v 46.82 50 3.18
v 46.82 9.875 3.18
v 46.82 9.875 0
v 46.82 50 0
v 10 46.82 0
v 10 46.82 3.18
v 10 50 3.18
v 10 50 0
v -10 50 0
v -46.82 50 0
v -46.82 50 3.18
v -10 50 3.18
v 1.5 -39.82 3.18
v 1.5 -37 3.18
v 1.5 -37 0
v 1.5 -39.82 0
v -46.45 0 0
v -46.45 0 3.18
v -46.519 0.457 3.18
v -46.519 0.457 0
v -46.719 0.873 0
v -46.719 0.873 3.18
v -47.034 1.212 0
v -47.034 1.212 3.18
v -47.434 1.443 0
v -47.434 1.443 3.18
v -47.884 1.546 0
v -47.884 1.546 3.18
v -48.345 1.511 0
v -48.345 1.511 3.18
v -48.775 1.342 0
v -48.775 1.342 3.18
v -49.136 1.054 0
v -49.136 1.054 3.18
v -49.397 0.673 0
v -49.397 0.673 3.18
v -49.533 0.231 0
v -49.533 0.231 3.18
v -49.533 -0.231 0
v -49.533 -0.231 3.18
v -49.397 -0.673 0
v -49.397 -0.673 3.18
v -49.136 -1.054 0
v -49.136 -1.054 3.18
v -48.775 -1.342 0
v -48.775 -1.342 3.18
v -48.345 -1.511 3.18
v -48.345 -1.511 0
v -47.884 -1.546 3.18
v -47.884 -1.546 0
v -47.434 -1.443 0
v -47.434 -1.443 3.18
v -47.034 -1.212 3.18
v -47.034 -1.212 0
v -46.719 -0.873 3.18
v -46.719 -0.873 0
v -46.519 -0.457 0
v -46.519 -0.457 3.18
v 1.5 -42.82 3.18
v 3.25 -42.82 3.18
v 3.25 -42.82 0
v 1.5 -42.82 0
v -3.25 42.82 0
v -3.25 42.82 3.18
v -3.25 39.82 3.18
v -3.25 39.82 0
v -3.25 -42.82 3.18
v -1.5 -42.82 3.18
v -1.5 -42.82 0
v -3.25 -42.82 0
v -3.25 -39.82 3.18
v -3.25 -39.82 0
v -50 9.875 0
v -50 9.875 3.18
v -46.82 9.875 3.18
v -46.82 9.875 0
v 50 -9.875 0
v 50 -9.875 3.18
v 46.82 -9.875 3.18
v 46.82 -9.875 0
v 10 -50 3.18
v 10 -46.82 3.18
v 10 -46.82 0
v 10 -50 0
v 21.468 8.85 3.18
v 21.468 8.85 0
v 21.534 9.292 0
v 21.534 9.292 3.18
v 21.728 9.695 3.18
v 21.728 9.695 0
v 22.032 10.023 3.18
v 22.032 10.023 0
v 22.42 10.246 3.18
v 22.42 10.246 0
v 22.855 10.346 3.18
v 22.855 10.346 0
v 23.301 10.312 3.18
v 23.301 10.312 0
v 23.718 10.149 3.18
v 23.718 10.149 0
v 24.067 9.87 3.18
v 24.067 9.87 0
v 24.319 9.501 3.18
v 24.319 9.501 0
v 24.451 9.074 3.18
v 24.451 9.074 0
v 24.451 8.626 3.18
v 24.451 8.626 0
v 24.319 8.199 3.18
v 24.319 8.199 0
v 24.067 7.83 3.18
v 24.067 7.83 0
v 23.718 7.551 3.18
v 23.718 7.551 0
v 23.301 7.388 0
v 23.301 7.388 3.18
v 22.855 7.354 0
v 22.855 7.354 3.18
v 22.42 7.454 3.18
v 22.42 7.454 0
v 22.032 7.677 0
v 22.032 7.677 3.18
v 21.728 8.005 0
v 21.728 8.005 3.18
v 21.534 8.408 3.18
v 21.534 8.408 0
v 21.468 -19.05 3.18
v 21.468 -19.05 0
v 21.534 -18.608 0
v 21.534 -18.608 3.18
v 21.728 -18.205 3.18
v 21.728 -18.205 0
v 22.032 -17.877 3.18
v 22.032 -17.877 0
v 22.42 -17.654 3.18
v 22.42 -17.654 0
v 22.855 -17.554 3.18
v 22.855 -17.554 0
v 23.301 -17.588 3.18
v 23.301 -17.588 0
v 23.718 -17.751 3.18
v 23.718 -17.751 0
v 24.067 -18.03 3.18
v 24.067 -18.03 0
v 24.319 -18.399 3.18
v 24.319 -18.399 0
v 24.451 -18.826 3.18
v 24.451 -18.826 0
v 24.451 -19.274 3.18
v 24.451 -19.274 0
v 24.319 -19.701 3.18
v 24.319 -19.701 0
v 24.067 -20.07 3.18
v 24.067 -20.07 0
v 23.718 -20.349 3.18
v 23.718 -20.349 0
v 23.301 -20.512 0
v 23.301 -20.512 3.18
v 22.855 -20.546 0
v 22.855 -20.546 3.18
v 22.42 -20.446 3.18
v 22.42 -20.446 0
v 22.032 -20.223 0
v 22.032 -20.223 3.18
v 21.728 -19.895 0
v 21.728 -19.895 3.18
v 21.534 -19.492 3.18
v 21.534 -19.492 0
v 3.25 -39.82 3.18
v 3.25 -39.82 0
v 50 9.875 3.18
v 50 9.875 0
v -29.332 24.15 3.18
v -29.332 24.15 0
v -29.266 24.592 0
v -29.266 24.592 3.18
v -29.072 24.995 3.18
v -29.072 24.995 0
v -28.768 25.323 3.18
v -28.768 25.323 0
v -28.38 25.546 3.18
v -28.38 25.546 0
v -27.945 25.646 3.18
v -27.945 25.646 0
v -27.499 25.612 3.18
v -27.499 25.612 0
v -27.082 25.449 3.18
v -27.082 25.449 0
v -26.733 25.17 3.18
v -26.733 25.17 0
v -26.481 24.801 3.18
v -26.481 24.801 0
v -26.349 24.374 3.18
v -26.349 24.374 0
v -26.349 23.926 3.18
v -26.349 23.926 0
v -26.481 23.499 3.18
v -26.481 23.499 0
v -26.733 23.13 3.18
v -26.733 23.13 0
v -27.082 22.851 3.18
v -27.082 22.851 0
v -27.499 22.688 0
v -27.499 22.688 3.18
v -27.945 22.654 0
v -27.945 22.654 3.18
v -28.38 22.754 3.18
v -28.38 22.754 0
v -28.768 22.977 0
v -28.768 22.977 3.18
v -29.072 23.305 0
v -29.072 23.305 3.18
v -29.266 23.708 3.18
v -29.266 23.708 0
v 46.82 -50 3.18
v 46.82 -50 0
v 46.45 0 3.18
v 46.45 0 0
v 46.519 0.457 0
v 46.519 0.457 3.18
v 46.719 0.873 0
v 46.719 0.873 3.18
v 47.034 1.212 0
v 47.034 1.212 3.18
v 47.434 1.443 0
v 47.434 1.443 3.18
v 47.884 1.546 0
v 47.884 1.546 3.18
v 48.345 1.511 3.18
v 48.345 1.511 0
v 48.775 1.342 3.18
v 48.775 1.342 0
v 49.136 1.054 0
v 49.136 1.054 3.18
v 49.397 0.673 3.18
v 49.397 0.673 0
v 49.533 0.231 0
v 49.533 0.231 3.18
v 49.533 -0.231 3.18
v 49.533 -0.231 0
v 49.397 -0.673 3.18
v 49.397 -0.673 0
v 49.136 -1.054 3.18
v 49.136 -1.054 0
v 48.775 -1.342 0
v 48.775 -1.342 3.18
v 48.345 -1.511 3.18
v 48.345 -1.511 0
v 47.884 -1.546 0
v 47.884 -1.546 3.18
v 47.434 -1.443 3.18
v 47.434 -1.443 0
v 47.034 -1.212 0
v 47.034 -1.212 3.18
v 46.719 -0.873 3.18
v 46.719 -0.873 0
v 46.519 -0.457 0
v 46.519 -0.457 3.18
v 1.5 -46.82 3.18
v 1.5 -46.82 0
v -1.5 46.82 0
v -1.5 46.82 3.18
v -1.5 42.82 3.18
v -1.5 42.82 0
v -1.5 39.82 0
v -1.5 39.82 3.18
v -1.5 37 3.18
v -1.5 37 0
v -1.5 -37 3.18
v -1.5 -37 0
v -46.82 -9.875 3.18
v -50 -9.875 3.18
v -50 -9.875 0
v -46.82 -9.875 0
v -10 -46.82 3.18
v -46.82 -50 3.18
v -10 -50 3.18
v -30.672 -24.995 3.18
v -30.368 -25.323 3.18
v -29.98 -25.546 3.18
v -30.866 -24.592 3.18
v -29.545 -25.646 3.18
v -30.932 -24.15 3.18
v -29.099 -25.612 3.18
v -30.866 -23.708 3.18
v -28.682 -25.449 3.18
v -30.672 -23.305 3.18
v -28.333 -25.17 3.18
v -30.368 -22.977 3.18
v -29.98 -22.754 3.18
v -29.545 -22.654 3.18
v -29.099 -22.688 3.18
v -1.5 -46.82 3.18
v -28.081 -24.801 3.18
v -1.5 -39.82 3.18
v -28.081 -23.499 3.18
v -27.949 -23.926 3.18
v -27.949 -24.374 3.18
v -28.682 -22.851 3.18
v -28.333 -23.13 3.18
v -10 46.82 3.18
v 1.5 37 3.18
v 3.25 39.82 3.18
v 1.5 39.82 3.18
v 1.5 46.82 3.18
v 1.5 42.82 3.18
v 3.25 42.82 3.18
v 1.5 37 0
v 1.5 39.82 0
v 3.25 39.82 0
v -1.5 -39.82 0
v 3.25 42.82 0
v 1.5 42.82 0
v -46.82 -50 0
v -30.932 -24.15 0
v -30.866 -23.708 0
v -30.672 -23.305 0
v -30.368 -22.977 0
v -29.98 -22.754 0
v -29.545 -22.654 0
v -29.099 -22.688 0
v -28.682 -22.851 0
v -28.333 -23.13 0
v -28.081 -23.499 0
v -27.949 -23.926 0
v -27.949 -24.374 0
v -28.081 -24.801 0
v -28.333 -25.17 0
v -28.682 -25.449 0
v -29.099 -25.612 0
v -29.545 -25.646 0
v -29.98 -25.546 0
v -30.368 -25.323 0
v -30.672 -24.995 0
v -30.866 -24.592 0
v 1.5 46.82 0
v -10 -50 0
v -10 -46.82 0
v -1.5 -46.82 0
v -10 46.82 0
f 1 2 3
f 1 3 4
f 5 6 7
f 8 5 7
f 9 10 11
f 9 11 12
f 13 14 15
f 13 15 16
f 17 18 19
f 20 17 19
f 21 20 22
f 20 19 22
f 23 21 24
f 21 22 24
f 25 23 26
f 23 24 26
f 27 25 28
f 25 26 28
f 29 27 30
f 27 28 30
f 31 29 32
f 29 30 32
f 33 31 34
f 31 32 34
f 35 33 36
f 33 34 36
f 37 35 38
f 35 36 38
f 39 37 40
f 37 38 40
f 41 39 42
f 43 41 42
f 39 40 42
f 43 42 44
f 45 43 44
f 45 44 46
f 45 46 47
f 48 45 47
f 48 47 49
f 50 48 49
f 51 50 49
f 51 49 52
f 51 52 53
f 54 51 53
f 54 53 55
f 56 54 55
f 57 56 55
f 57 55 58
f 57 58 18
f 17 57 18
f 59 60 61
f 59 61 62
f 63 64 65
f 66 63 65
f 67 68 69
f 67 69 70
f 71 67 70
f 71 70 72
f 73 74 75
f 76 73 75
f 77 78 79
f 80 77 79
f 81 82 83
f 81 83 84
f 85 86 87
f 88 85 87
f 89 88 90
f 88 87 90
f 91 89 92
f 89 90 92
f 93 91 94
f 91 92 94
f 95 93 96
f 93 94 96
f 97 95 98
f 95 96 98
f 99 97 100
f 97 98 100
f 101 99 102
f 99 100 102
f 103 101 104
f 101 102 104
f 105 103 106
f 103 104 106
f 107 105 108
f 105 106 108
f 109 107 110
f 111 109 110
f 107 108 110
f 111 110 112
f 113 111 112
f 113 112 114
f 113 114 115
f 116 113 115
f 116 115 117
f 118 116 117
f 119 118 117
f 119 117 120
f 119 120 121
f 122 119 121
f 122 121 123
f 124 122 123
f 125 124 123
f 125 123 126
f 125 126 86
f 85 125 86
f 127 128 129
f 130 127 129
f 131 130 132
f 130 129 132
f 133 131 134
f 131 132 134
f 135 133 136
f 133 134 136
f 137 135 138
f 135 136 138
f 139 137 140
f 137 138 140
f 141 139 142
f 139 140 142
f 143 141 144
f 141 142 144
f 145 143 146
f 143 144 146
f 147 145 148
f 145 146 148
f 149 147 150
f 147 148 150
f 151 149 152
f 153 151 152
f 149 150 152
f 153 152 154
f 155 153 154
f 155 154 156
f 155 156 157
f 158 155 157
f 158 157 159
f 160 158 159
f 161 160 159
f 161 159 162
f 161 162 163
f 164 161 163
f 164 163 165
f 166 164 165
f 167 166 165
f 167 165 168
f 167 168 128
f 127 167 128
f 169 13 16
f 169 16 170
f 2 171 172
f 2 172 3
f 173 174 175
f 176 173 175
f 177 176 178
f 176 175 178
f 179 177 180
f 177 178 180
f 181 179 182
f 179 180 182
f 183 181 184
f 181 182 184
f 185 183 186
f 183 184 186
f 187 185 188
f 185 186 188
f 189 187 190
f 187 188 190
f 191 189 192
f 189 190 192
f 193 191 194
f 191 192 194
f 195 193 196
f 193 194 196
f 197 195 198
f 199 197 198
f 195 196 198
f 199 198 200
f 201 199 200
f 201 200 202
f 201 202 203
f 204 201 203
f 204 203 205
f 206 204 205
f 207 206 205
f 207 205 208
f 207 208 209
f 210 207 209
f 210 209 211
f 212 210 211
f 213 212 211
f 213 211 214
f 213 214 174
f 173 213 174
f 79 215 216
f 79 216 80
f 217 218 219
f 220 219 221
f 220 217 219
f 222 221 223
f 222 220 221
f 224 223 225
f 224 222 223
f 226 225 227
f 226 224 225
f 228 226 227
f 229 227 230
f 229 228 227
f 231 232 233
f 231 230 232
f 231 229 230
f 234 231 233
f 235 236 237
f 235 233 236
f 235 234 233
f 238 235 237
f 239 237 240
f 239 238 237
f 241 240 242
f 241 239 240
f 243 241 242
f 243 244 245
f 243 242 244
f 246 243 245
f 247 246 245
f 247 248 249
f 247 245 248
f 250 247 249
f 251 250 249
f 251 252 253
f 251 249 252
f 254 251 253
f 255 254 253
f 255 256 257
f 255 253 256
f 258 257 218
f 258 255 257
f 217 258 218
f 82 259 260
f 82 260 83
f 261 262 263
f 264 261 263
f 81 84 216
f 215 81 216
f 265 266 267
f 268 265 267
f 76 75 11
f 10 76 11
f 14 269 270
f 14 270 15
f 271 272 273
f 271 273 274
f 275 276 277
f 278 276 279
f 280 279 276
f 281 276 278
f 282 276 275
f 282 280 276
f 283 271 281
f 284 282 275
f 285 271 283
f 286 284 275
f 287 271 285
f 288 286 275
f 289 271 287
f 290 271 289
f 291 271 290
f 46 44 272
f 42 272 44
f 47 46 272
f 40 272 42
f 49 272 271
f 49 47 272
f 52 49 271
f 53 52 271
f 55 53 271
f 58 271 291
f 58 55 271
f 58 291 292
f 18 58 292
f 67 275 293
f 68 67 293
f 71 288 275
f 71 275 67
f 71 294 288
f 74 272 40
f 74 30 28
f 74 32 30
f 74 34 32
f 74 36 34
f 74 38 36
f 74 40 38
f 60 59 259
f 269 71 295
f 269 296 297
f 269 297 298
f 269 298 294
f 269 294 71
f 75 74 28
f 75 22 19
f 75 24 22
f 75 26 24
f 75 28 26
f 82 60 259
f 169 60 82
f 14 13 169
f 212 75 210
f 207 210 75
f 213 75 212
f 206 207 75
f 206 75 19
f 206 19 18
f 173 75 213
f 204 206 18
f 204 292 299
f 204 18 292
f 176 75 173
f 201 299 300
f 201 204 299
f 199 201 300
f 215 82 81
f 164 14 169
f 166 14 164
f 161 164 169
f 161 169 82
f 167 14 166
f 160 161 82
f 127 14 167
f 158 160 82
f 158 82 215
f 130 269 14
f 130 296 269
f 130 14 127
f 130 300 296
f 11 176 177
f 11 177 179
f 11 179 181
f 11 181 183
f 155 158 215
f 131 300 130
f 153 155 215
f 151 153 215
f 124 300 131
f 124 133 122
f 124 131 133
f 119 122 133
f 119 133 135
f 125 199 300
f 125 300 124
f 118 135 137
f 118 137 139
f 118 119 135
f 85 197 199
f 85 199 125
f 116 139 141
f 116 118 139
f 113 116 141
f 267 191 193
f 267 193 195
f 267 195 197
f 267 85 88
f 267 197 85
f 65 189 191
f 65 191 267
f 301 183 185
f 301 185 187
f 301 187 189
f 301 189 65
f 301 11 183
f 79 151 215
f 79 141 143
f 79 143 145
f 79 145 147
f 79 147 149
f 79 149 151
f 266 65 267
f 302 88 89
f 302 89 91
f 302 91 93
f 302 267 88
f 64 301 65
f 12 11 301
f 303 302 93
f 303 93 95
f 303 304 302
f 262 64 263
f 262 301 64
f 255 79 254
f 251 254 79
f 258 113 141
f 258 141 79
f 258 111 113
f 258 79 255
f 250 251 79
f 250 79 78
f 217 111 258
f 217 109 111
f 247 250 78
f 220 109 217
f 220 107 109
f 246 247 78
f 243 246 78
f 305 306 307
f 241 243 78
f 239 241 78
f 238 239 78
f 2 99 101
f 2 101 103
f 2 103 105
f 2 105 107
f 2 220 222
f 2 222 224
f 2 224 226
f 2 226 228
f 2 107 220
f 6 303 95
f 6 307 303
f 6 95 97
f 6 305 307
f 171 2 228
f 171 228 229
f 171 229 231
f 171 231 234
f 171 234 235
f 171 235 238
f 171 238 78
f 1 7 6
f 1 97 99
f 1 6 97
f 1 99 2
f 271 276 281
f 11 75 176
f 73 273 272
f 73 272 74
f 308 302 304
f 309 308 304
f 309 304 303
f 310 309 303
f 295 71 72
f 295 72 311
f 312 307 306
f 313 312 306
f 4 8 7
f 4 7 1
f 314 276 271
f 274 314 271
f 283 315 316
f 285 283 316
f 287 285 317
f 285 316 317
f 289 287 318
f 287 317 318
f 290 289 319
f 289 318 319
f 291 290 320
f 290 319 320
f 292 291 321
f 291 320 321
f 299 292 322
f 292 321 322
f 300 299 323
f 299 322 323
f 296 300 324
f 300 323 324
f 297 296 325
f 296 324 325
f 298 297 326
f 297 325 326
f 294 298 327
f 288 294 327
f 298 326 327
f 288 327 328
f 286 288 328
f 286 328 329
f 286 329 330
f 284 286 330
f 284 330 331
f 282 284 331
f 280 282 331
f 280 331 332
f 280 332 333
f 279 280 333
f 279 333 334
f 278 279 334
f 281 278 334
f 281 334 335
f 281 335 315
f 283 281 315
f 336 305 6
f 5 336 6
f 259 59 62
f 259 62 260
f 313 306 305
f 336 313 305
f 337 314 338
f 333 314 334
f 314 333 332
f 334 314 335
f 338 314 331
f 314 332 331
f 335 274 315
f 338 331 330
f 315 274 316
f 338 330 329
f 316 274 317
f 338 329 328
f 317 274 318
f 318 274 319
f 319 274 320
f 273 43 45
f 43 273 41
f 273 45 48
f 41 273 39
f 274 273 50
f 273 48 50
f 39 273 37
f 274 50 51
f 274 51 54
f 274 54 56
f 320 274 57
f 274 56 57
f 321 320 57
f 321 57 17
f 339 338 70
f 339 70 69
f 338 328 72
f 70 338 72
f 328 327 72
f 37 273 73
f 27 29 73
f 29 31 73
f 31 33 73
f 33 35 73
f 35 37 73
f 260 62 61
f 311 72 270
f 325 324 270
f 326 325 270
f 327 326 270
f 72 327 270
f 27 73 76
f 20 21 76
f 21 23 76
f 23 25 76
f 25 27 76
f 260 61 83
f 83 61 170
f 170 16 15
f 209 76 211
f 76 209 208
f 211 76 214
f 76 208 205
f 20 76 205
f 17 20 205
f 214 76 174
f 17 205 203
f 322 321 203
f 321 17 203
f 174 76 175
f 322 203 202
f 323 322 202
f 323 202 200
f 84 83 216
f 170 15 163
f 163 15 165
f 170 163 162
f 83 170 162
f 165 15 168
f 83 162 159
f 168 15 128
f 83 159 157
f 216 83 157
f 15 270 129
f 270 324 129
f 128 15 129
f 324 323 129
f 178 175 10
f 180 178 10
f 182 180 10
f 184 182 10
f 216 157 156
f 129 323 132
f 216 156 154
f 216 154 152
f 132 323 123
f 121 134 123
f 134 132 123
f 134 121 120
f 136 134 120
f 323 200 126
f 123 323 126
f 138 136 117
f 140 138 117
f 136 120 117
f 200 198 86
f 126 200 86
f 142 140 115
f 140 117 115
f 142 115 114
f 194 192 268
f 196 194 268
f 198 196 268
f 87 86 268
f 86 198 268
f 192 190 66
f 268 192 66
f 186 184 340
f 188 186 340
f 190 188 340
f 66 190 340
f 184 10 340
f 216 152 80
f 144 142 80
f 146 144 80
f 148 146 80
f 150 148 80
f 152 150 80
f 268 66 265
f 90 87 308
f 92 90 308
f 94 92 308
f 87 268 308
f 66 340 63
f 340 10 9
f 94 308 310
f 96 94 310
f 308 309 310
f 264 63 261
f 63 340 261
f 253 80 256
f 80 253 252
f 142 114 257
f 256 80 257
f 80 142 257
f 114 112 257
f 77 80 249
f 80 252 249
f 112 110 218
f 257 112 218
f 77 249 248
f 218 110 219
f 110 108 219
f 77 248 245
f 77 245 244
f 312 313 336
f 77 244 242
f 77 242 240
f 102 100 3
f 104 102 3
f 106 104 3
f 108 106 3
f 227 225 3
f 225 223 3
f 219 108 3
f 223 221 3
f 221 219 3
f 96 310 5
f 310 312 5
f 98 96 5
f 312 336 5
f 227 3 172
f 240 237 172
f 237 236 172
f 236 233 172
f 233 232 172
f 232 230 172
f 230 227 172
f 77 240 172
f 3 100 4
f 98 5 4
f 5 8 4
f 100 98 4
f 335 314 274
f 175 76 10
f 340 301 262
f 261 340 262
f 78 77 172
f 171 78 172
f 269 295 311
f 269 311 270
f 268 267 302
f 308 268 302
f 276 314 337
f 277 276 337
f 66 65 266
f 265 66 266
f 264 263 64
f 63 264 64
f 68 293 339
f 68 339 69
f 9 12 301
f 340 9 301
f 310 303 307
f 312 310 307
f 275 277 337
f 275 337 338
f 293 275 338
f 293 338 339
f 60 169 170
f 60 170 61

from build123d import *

# Parameters (mm, degrees)
SKETCH1_W           = 100
SKETCH1_H           = 100
BOSS_EXTRUDE2_DEPTH = 3.18
SKETCH2_R           = 1.55
SKETCH2_W           = 3.18
SKETCH2_H           = 40.125
CUT_EXTRUDE1_DEPTH  = 4.18
SKETCH3_R           = 1.5
CUT_EXTRUDE2_DEPTH  = 4.18


with BuildPart() as part:
    # Sketch1 → Boss-Extrude2 (new body)
    with BuildSketch(Plane.XY):
        Rectangle(SKETCH1_W, SKETCH1_H)
    extrude(amount=BOSS_EXTRUDE2_DEPTH)

    # Sketch2 → Cut-Extrude1 (cut, through all)
    with BuildSketch(Plane.XY.offset(3.18)):
        with Locations((-48, 0)):
            Circle(SKETCH2_R)
        Polygon((-10, 50), (-10, 46.82), (-1.5, 46.82), (-1.5, 42.82), (-3.25, 42.82), (-3.25, 39.82), (-1.5, 39.82), (-1.5, 37), (1.5, 37), (1.5, 39.82), (3.25, 39.82), (3.25, 42.82), (1.5, 42.82), (1.5, 46.82), (10, 46.82), (10, 50), align=None)
        with Locations((-48.41, 29.9375)):
            Rectangle(SKETCH2_W, SKETCH2_H)
        with Locations((-48.41, -29.9375)):
            Rectangle(SKETCH2_W, SKETCH2_H)
    cut_extrude1 = extrude(amount=-CUT_EXTRUDE1_DEPTH, mode=Mode.SUBTRACT)

    # Mirror1: Cut-Extrude1 across plane
    add(cut_extrude1.mirror(Plane.ZX), mode=Mode.SUBTRACT)

    # Mirror3: Cut-Extrude1 across plane
    add(cut_extrude1.mirror(Plane(origin=(0, 0, 0), x_dir=(0, 0, 1), z_dir=(1, 0, 0))), mode=Mode.SUBTRACT)

    # Sketch3 → Cut-Extrude2 (cut, through all)
    with BuildSketch(Plane(origin=(0, 0, 0), x_dir=(-1, 0, 0), z_dir=(0, 0, -1))):
        with Locations((27.832447704, 24.15)):
            Circle(SKETCH3_R)
        with Locations((29.432447704, -24.15)):
            Circle(SKETCH3_R)
        with Locations((-22.967552296, -19.05)):
            Circle(SKETCH3_R)
        with Locations((-22.967552296, 8.85)):
            Circle(SKETCH3_R)
    extrude(amount=-CUT_EXTRUDE2_DEPTH, mode=Mode.SUBTRACT)


solid = part.part
